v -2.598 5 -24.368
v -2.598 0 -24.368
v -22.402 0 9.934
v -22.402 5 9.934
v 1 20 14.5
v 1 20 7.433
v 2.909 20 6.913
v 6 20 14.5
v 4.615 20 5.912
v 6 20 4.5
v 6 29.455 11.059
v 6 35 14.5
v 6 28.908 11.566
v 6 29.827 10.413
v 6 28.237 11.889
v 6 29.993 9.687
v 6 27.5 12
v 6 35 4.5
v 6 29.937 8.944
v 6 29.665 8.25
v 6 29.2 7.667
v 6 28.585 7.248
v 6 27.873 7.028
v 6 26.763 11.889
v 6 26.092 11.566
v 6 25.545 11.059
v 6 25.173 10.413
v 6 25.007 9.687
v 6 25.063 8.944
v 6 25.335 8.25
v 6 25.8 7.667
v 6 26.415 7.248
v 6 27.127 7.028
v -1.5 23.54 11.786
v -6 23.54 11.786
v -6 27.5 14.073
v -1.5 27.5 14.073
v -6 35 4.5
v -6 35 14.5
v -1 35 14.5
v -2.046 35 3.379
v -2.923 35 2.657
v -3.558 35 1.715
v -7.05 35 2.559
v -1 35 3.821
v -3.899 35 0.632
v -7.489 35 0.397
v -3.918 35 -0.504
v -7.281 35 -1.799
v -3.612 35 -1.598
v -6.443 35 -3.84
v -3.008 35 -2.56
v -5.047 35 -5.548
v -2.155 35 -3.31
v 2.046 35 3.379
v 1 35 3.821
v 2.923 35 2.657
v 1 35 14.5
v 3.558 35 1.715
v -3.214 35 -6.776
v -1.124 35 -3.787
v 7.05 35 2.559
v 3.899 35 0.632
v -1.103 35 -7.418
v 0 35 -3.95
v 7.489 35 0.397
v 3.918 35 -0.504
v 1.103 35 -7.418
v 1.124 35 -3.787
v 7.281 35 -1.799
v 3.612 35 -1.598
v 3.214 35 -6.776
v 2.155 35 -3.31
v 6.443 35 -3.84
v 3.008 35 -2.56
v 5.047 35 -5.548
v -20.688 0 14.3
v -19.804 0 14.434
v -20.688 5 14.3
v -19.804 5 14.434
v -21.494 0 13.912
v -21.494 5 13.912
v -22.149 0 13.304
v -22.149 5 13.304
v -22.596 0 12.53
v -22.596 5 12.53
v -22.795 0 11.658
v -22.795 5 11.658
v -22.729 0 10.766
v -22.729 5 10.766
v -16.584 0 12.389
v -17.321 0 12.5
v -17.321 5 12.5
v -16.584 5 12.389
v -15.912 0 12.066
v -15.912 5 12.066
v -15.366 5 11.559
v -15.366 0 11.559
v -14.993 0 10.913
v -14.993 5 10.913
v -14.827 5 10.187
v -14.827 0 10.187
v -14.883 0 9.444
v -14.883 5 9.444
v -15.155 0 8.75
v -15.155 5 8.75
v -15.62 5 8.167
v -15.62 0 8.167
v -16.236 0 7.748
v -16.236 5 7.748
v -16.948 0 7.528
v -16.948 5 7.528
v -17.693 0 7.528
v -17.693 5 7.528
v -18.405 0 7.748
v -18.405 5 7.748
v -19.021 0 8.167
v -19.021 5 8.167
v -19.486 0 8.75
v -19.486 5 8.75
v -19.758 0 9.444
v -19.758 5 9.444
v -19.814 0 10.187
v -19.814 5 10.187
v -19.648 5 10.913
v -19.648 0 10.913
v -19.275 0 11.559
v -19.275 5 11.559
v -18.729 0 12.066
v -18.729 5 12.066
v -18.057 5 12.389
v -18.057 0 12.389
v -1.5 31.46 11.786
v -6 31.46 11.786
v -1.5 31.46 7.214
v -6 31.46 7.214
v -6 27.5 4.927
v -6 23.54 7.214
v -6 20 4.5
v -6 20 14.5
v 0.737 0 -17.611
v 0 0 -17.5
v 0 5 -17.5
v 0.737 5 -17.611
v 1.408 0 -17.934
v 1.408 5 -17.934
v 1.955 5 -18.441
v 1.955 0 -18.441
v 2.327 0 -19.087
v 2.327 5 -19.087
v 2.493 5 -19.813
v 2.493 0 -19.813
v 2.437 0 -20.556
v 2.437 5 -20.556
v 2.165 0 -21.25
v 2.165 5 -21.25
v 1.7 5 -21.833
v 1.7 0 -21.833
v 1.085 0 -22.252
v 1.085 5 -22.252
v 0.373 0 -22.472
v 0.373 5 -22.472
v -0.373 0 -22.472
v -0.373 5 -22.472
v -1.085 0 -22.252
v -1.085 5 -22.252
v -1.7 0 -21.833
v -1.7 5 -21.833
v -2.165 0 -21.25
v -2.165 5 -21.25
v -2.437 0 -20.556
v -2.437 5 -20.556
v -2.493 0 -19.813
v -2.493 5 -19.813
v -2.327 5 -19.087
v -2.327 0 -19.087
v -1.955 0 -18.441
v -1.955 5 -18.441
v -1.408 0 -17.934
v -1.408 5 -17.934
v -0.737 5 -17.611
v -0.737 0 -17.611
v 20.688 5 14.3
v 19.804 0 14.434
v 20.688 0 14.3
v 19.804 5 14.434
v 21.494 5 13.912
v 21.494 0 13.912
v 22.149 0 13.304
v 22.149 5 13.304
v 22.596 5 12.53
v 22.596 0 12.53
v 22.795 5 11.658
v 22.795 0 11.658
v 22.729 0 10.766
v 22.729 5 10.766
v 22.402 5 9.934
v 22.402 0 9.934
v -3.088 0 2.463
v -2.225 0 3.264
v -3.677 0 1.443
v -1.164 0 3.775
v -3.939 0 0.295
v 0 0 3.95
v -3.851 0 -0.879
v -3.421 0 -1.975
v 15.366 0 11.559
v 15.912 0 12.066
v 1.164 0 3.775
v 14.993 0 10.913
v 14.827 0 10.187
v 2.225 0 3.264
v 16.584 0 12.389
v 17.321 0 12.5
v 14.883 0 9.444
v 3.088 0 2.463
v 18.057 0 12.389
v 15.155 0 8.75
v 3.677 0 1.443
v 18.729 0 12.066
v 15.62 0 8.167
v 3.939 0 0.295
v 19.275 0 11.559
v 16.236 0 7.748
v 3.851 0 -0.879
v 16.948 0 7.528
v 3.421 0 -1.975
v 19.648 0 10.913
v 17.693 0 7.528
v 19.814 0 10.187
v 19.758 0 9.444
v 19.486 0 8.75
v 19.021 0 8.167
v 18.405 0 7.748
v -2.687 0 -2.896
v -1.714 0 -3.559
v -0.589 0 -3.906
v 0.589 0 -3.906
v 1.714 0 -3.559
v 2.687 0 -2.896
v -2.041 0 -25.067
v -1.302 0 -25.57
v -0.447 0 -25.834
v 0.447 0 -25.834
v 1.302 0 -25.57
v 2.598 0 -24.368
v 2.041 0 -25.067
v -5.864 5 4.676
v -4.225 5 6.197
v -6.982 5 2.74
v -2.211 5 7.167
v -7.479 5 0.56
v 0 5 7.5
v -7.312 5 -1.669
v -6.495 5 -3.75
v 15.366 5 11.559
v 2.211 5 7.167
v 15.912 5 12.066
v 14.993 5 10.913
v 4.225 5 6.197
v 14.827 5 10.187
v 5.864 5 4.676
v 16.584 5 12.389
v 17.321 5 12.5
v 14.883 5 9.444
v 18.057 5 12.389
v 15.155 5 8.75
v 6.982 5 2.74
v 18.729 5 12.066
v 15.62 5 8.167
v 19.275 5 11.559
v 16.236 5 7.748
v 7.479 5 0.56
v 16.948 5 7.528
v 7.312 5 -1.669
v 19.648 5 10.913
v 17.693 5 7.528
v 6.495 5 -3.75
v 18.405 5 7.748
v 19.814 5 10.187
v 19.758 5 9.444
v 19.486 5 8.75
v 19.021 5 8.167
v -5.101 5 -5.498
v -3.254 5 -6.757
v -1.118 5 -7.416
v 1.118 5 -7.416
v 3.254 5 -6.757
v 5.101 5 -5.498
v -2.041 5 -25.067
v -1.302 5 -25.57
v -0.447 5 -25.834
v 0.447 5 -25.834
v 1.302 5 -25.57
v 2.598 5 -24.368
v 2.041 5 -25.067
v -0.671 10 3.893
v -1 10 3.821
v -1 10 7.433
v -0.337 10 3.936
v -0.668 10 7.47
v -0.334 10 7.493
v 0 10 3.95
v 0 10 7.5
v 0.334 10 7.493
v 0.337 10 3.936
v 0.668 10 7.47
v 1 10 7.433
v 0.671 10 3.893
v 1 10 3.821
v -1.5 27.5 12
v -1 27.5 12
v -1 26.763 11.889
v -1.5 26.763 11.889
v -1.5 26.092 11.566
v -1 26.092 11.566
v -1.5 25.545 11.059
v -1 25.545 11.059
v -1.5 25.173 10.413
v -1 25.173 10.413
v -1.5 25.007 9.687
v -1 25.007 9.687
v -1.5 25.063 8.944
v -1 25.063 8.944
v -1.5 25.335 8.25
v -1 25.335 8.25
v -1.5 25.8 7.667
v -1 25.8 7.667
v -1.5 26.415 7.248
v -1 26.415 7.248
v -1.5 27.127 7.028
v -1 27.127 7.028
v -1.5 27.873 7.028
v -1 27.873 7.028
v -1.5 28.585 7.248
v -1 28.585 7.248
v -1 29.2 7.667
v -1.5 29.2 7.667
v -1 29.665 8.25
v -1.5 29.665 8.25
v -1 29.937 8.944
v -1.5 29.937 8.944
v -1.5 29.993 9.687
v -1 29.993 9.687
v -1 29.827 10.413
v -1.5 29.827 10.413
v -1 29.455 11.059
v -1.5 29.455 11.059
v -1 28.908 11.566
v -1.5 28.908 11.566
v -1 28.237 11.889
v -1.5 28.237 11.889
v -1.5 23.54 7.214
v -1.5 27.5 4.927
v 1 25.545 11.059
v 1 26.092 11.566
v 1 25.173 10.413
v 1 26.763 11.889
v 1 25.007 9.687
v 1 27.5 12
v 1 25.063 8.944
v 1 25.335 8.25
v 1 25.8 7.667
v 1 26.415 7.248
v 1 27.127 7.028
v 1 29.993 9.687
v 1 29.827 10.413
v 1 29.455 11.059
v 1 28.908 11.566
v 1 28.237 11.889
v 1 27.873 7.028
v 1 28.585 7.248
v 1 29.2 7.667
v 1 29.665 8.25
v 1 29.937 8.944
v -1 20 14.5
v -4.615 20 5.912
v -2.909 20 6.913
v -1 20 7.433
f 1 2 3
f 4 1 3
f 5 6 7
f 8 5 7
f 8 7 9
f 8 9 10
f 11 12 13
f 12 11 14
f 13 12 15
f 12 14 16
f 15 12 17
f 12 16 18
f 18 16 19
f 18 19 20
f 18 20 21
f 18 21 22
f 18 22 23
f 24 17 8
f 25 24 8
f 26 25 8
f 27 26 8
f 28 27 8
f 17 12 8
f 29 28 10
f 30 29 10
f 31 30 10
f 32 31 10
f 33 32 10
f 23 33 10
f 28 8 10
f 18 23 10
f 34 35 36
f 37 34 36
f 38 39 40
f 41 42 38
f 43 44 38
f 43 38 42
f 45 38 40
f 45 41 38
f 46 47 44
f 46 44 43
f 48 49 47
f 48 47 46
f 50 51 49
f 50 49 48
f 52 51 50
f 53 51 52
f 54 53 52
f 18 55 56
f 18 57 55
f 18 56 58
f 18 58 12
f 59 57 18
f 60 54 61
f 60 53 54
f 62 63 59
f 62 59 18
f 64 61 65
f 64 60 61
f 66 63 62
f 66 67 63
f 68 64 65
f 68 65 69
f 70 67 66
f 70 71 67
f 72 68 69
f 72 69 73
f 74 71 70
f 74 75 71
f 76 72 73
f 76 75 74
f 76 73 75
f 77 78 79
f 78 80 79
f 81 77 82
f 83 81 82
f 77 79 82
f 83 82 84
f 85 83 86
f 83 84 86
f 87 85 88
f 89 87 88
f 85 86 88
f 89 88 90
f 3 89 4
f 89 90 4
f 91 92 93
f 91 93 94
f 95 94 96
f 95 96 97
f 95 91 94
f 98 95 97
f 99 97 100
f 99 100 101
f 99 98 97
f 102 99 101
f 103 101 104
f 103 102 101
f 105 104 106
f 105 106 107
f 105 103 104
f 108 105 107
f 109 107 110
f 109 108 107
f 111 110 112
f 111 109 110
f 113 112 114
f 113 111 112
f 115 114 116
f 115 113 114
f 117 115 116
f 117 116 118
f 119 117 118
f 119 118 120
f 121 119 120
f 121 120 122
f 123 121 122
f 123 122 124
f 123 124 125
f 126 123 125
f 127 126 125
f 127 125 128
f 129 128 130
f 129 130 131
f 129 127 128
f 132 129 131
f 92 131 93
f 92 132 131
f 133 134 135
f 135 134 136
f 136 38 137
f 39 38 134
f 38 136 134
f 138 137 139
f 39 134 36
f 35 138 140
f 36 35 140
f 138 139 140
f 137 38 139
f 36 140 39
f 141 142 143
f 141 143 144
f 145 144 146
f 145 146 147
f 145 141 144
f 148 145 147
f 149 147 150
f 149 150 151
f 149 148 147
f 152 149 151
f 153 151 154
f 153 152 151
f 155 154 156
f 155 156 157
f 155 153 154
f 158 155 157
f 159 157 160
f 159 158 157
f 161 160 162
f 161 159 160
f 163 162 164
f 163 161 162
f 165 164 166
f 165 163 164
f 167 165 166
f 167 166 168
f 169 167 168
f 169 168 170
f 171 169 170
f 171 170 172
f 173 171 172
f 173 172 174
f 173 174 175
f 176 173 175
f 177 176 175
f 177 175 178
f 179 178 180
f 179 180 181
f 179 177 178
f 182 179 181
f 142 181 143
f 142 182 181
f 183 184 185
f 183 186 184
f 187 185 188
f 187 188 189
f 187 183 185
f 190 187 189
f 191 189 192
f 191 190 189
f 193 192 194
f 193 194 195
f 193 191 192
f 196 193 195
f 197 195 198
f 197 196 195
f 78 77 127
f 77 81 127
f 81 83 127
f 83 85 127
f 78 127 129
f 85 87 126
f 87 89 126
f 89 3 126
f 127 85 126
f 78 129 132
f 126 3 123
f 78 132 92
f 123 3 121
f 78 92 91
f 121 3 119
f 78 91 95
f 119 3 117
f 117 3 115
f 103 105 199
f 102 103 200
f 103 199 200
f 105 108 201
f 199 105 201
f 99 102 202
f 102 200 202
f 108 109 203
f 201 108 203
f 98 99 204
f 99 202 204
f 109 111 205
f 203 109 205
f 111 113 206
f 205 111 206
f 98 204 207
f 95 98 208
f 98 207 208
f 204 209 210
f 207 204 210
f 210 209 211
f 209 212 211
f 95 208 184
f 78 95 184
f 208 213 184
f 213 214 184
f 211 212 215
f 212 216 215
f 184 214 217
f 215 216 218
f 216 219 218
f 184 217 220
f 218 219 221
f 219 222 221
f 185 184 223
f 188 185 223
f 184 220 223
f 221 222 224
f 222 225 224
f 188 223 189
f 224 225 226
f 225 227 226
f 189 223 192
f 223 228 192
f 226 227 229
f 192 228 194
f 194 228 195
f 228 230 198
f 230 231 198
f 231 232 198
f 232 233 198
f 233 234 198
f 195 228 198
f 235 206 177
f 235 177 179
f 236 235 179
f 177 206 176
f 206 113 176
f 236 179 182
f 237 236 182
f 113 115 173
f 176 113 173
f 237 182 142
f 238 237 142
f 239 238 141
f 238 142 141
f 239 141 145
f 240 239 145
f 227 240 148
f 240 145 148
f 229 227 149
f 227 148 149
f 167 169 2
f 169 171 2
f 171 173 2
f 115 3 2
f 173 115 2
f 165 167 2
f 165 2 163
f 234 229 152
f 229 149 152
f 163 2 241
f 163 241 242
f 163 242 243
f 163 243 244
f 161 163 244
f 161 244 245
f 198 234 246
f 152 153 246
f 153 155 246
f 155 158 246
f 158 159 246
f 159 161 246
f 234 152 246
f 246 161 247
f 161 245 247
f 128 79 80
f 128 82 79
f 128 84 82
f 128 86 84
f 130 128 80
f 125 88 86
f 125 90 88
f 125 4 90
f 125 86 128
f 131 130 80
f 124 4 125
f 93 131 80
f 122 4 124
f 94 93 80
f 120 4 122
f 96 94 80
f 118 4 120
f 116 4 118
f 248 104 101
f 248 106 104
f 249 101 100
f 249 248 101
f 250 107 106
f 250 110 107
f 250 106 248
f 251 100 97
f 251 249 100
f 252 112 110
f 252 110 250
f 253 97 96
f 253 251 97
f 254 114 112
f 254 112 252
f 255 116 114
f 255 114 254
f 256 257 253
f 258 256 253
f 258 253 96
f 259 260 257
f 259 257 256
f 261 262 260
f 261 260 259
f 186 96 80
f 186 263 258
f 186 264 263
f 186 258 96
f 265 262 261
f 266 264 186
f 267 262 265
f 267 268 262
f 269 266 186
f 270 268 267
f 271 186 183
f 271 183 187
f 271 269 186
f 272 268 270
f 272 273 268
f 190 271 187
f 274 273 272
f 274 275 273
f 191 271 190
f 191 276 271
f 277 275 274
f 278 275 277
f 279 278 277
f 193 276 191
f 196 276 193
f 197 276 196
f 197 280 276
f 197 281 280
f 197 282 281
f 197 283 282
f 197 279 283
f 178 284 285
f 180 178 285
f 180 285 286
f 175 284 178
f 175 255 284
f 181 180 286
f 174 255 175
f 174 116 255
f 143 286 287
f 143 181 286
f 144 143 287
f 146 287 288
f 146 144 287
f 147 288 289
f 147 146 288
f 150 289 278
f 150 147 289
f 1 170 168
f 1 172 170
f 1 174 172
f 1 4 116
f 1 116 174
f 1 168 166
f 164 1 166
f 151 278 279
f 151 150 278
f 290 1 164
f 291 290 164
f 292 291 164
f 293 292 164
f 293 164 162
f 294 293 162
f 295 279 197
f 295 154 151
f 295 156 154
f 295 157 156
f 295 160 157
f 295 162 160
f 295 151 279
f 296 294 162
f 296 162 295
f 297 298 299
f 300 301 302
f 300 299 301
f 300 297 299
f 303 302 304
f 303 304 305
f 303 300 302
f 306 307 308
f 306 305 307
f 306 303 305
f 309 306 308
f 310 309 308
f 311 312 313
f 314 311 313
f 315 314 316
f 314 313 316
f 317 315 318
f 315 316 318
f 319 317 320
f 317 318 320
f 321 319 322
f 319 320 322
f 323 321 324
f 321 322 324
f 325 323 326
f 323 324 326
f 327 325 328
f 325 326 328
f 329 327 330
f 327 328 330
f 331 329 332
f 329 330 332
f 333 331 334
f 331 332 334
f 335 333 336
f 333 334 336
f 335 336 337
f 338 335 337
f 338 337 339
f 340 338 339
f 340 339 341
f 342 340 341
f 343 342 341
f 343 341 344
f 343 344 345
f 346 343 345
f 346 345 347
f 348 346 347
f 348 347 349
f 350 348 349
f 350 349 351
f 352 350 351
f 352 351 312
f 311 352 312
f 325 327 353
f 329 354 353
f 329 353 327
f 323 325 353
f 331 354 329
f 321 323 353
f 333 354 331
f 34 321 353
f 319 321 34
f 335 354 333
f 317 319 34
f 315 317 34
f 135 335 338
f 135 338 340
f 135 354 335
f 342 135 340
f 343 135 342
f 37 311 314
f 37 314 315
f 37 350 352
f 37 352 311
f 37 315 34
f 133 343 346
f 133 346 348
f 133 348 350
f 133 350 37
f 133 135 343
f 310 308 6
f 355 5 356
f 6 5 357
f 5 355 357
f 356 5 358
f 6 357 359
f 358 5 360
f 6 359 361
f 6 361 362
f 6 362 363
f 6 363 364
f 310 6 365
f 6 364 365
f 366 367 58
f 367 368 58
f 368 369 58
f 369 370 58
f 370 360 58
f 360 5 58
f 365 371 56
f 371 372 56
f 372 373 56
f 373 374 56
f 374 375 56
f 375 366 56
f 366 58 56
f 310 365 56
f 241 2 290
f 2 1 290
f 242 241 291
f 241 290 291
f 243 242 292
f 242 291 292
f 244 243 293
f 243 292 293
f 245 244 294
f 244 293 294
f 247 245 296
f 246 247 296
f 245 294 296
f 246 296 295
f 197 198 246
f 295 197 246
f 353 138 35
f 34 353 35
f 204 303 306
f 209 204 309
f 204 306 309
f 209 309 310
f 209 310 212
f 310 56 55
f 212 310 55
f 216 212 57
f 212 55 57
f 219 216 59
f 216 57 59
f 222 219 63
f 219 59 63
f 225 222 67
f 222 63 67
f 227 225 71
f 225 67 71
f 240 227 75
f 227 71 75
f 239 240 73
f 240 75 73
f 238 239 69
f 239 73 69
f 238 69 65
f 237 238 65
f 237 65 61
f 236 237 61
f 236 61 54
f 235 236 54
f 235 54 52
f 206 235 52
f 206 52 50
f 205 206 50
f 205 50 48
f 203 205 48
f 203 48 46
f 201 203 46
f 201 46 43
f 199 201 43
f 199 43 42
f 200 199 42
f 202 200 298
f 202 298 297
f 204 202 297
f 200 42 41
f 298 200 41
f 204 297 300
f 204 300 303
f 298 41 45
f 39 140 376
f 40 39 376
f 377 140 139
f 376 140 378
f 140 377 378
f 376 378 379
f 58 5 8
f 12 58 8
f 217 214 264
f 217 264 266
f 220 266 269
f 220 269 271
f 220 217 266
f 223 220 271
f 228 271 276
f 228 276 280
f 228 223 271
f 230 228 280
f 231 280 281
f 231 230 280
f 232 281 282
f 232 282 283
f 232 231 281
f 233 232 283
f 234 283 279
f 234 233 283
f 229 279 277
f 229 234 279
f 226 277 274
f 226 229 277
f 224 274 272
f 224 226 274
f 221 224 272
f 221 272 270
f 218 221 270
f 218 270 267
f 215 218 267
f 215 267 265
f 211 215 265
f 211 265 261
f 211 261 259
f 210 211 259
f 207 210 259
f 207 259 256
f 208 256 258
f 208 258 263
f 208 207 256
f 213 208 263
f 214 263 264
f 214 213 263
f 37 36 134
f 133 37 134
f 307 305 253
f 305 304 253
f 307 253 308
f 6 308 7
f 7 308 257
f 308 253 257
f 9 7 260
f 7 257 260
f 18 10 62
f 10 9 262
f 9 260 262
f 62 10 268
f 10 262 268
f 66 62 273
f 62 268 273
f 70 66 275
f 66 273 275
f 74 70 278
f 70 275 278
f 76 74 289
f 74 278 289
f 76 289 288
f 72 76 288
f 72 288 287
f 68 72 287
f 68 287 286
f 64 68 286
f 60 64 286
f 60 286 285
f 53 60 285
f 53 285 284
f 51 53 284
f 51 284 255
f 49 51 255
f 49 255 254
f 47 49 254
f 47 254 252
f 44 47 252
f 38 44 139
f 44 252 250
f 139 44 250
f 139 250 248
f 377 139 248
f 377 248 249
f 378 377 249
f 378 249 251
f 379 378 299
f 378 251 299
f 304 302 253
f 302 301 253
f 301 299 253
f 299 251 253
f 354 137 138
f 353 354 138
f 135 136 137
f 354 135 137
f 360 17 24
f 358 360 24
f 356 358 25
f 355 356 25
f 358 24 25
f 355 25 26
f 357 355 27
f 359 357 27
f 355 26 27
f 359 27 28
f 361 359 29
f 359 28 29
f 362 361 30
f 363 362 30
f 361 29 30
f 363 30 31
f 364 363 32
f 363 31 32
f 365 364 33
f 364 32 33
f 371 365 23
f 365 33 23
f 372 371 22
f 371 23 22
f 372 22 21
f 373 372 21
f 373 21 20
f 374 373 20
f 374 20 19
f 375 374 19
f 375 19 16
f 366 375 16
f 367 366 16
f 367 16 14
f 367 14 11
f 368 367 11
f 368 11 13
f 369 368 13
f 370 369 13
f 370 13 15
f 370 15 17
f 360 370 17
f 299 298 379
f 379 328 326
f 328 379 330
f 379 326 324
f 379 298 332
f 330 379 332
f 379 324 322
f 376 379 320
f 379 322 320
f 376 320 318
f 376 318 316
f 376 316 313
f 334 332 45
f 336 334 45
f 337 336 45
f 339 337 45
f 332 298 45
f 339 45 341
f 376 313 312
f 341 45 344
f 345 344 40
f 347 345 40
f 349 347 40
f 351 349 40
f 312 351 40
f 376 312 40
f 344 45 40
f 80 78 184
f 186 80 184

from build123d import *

# Parameters (mm, degrees)
ESQUISSE5_R             = 2.5
BOSS_EXTRU_2_DEPTH      = 5
ESQUISSE6_R             = 7.5
BOSS_EXTRU_3_DEPTH      = 30
BOSS_EXTRU_6_START      = -15
BOSS_EXTRU_6_DEPTH      = 15
ESQUISSE14_R            = 3.95
ENL_V_MAT_EXTRU_4_DEPTH = 52.800900893
ENL_V_MAT_EXTRU_5_DEPTH = 25
CONG_2_R                = 3
ESQUISSE17_R            = 2.5
ENL_V_MAT_EXTRU_6_DEPTH = 53.189940485
ENL_V_MAT_EXTRU_7_DEPTH = 4.5


with BuildPart() as part:
    # Esquisse5 → Boss.-Extru.2 (new body)
    with BuildSketch(Plane(origin=(0, 0, 0), x_dir=(1, 0, 0), z_dir=(0, 1, 0))):
        Polygon((-25, -14.43375673), (25, -14.43375673), (0, 28.867513459), align=None)
        with Locations(Location((0, 20, 0), (0, 0, 270))):
            Circle(ESQUISSE5_R, mode=Mode.SUBTRACT)
        with Locations(Location((-17.320508076, -10, 0), (0, 0, 270))):
            Circle(ESQUISSE5_R, mode=Mode.SUBTRACT)
        with Locations(Location((17.320508076, -10, 0), (0, 0, 270))):
            Circle(ESQUISSE5_R, mode=Mode.SUBTRACT)
    extrude(amount=BOSS_EXTRU_2_DEPTH)

    # Esquisse6 → Boss.-Extru.3 (add)
    with BuildSketch(Plane(origin=(0, 5, 0), x_dir=(1, 0, 0), z_dir=(0, 1, 0))):
        with Locations(Location((0, 0, 0), (0, 0, 270))):
            Circle(ESQUISSE6_R)
    extrude(amount=BOSS_EXTRU_3_DEPTH)

    # Esquisse13 → Boss.-Extru.6 (add)
    with BuildSketch(Plane(origin=(0, 35, 0), x_dir=(1, 0, 0), z_dir=(0, 1, 0)).offset(BOSS_EXTRU_6_START)):
        with BuildLine():
            Line((-6, -4.5), (-6, -14.5))
            Line((-6, -14.5), (6, -14.5))
            Line((6, -14.5), (6, -4.5))
            ThreePointArc((6, -4.5), (0, -7.5), (-6, -4.5))
        make_face()
    extrude(amount=BOSS_EXTRU_6_DEPTH)

    # Esquisse14 → Enlèv. mat.-Extru.4 (cut, through all)
    with BuildSketch(Plane(origin=(0, 35, 0), x_dir=(1, 0, 0), z_dir=(0, 1, 0))):
        with Locations(Location((0, 0, 0), (0, 0, 270))):
            Circle(ESQUISSE14_R)
    extrude(amount=-ENL_V_MAT_EXTRU_4_DEPTH, mode=Mode.SUBTRACT)

    # Esquisse15 → Enlèv. mat.-Extru.5 (cut)
    with BuildSketch(Plane(origin=(0, 35, 0), x_dir=(1, 0, 0), z_dir=(0, 1, 0))):
        with BuildLine():
            Line((-1, -3.821321761), (-1, -14.5))
            Line((-1, -14.5), (1, -14.5))
            Line((1, -14.5), (1, -3.821321761))
            ThreePointArc((1, -3.821321761), (0, -3.95), (-1, -3.821321761))
        make_face()
    extrude(amount=-ENL_V_MAT_EXTRU_5_DEPTH, mode=Mode.SUBTRACT)

    # Congé2
    cong_2_edges = [part.edges().sort_by_distance(p)[0] for p in [
        (0, 2.5, -28.867513459),
        (25, 2.5, 14.43375673),
        (-25, 2.5, 14.43375673),
    ]]
    fillet(cong_2_edges, radius=CONG_2_R)

    # Esquisse17 → Enlèv. mat.-Extru.6 (cut, through all)
    with BuildSketch(Plane(origin=(6, 0, 0), x_dir=(0, 0, -1), z_dir=(1, 0, 0))):
        with Locations(Location((-9.5, 27.5, 0), (0, 0, 180))):
            Circle(ESQUISSE17_R)
    extrude(amount=-ENL_V_MAT_EXTRU_6_DEPTH, mode=Mode.SUBTRACT)

    # Esquisse18 → Enlèv. mat.-Extru.7 (cut)
    with BuildSketch(Plane.ZY.offset(6)):
        Polygon((11.786307066, 31.46), (7.213692934, 31.46), (4.927385868, 27.5), (7.213692934, 23.54), (11.786307066, 23.54), (14.072614132, 27.5), align=None)
    extrude(amount=-ENL_V_MAT_EXTRU_7_DEPTH, mode=Mode.SUBTRACT)


solid = part.part
